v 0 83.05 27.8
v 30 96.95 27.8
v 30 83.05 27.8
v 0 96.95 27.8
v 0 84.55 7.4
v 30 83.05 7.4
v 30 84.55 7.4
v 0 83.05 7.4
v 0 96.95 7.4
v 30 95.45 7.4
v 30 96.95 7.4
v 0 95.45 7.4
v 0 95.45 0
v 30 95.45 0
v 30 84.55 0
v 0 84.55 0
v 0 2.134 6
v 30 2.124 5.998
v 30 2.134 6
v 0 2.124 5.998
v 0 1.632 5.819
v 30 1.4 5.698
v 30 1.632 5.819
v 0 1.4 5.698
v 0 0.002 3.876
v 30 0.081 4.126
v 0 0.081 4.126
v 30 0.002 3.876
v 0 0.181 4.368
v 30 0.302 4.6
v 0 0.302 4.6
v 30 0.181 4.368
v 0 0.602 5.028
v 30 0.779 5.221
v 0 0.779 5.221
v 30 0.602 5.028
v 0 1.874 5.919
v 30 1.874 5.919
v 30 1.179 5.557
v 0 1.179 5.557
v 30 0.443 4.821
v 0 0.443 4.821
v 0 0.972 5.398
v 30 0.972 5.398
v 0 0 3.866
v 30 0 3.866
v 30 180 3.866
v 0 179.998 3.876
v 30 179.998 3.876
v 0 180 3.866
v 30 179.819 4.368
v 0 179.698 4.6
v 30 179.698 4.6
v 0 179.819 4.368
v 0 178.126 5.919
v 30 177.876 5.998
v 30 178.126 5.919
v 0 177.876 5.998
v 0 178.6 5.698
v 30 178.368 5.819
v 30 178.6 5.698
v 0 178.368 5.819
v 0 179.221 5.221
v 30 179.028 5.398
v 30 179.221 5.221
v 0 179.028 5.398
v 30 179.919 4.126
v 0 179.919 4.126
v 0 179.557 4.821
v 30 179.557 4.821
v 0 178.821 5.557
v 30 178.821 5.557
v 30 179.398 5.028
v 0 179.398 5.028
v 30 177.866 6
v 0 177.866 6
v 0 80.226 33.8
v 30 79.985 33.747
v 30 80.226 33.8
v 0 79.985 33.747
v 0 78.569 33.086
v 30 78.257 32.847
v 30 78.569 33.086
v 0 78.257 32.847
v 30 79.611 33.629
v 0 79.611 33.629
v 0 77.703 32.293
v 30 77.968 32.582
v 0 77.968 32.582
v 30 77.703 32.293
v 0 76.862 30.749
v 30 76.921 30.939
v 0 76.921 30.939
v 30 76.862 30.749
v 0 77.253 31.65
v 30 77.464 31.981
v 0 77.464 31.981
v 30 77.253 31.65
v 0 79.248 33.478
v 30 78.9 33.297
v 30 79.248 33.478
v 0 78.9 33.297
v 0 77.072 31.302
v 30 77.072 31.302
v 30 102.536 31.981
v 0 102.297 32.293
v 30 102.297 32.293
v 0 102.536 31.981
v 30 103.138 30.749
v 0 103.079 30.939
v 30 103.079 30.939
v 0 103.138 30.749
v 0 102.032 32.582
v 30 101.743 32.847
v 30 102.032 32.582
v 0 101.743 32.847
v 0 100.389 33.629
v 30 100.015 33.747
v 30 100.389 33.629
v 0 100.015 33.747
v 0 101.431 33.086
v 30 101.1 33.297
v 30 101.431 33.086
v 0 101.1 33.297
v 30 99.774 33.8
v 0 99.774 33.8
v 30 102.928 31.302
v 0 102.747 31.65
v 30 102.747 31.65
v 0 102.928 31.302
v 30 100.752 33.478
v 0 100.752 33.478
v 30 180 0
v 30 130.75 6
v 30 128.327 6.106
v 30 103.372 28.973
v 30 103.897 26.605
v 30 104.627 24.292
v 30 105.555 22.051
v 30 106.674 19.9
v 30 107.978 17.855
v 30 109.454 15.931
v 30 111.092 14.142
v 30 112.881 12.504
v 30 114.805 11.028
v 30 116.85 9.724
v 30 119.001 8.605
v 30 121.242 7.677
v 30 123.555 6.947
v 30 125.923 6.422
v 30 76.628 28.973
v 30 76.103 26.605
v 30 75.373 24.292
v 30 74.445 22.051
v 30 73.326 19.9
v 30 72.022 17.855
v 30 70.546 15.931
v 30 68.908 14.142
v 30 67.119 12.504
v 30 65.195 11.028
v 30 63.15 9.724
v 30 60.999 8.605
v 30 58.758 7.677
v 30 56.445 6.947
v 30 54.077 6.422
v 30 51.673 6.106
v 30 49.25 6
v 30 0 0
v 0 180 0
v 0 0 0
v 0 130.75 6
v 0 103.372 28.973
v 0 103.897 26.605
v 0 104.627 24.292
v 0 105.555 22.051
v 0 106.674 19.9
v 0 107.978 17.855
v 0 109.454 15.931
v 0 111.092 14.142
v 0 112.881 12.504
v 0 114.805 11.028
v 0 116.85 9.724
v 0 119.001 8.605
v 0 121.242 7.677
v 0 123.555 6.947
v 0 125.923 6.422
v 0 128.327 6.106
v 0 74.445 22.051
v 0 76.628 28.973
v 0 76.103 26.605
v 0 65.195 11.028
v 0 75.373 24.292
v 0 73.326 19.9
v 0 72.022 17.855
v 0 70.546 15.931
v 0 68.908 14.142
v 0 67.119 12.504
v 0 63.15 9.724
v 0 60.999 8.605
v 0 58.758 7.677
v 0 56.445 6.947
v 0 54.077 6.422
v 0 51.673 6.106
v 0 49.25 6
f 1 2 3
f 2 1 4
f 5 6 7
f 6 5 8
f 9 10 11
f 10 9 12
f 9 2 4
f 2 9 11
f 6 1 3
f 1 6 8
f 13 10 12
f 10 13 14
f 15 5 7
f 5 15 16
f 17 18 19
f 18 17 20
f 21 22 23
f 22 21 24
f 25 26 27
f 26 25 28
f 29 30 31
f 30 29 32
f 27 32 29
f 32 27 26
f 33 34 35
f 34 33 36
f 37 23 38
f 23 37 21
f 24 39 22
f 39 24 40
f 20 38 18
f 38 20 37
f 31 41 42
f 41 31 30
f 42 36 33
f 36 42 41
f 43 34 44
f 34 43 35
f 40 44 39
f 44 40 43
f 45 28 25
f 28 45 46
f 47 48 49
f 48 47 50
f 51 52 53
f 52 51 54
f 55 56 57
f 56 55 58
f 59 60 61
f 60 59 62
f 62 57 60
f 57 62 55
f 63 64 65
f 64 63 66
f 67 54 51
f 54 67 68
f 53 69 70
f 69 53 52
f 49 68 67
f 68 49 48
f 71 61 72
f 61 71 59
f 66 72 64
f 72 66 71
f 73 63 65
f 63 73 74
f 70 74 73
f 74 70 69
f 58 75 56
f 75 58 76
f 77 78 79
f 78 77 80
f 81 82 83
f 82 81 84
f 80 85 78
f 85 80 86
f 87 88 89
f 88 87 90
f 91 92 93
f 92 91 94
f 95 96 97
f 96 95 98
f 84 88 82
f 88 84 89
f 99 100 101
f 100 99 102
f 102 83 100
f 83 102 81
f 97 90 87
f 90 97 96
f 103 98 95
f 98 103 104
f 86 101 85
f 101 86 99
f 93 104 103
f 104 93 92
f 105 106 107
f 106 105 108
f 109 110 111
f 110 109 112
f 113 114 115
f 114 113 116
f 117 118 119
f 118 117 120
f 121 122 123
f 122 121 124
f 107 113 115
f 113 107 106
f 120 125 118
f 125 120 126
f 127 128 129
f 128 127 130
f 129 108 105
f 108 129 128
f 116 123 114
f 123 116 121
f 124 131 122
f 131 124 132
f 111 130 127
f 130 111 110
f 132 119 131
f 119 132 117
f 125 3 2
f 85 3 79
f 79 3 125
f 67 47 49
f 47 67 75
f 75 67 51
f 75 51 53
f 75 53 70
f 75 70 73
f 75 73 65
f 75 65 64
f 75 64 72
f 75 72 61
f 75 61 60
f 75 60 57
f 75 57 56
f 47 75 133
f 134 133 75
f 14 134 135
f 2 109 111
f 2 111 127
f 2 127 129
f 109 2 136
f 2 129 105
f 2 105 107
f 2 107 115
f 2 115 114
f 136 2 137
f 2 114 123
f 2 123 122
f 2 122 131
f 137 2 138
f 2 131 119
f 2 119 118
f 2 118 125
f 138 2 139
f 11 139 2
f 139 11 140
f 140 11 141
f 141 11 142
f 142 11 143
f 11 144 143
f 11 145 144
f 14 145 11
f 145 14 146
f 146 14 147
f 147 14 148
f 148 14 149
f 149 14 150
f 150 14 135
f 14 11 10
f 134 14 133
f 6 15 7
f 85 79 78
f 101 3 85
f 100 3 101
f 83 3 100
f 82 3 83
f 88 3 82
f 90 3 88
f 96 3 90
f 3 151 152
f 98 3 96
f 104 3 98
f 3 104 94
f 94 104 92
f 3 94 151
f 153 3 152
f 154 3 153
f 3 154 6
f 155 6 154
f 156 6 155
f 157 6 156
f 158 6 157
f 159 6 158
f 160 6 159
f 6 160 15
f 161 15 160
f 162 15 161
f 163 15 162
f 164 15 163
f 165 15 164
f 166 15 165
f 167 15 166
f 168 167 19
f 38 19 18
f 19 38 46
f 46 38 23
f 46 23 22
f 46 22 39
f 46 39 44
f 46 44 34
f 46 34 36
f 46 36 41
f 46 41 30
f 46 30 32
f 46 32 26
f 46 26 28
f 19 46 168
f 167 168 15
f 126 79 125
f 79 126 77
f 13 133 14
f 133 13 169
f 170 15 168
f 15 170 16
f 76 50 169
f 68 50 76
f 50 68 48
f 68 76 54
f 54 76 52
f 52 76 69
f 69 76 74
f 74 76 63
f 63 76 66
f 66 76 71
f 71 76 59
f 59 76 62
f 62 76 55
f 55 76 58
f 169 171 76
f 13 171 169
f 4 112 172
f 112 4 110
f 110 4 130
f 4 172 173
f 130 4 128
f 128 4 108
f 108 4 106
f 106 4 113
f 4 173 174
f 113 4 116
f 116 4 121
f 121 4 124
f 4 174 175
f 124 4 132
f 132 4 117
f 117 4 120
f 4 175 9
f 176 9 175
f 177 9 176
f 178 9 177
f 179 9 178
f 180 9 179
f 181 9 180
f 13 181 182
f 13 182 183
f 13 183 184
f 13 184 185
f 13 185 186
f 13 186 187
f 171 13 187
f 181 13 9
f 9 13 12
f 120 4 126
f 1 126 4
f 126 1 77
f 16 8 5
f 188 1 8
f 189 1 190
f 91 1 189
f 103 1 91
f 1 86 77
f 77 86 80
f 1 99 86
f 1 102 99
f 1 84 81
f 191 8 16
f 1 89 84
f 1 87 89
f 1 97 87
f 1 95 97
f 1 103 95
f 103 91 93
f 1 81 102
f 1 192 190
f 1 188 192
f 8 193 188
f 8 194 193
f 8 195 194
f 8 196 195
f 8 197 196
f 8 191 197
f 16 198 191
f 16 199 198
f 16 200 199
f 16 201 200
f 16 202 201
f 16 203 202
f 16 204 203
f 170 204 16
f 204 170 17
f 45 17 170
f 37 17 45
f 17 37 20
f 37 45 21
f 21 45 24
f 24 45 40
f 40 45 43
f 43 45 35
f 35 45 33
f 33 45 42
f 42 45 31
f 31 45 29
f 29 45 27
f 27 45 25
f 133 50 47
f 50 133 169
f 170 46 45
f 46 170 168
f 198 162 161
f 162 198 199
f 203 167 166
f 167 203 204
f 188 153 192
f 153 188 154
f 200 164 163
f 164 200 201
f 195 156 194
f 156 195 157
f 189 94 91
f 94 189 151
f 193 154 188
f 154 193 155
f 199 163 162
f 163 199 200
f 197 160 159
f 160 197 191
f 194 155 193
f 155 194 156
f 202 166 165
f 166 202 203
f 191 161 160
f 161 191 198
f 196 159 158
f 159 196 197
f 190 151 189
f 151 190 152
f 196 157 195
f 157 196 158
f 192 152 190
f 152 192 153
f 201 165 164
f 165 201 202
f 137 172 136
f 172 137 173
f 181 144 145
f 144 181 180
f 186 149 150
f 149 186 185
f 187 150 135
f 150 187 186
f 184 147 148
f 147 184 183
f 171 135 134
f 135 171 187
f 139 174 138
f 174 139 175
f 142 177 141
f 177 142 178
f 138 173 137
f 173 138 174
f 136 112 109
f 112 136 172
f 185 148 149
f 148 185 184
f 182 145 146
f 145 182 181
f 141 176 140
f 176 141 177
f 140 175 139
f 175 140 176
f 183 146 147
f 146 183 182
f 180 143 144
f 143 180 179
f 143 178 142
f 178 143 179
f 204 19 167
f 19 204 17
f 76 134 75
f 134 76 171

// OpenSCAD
// [FL_INDEX: keywords="openscad, 3d_parametric, Clip-on_feet_for_play_yard_fence__North_States_Superyard, csg_solid" | COT="Parametric OpenSCAD design from 3DCodeverse"]
// Title: Clip-on feet for play yard fence (North States Superyard)

len = 180; // non-test: 185; test: 90;
wid = 30; // non-test: 25 (was: 30); test: 7;
thk = 6;
gap = 7.4; // == 27.8 - 20.4 (between floor and bottom rail)

w = 13.9;  // bottom rail width
h = 27.8; // rail height + floor gap // 20.4 -> .7 fillet offset; 27.8 -> .6 fillet offset
h0 = 20.4;  // rail height
clip_thk=1.5;  // inset on each side (below rail, to keep foot tight onto rail)

bottom = false;  // experimental design

rad = 27.8;  // curvature; will need to change hardcoded offsets of top fillets if this changes (see TODO below)


$fn=72;

module fillet(r, h) {
  difference() {
    cube([h, r, r]);
    translate([-1, 0, 0]) rotate([0, 90, 0]) cylinder(h=h+2, r=r);
  }
}

module main() {
  // Ugly eqn warning (lazy approach to geometry: trig it to death :)
  ph = 0.5*acos((rad-h)/rad);
  y = h/tan(ph);
  l2 = 0.5*(len - w - 2*thk);

  union() {
    difference () {
      cube([wid, len, (bottom ? h0+gap+thk/4 : h+thk)]);
      // Rounded-off top (...)
      translate([-1, l2-y, thk+rad]) rotate([0, 90, 0]) cylinder(r = rad, h = wid+2);
      translate([-1, len-l2+y, thk+rad]) rotate([0, 90, 0]) cylinder(r = rad, h = wid+2);
      translate([-1, -1, thk]) cube([wid+2, l2-y+1, h+gap+1]);
      translate([-1, len-l2+y, thk]) cube([wid+2, l2-y+1, h+gap+1]);
      // Slot
      if (bottom) {
        translate([-1, l2+thk, gap]) cube([wid+2, w, h0]);
        translate([-1, l2+1.25*thk, gap+thk/2]) cube([wid+2, w-thk/2, h0]);
      } else {
        translate([-1, l2+thk, h-h0]) cube([wid+2, w, h0]);
        translate([-1, l2+thk+clip_thk, -1]) cube([wid+2, w-2*clip_thk, h0+1]);
      }
      // Base fillet
      translate([-1,thk/2-.1,thk/2+.1]) rotate([90,0,0]) fillet(h=wid+2,r=thk/2);
      translate([-1,len-thk/2+.1,thk/2+.1]) fillet(h=wid+2,r=thk/2);
      // Top fillet; TODO: parameterize 1.5/0.4 hardcoded offsets
      translate([-1,l2+0.75*thk-(bottom?1.5:.4),thk/4+(bottom ? h0+gap-0.75*thk : h)+.1]) rotate([90,0,0]) fillet(h=wid+2,r=0.75*thk);
      translate([-1,len-l2-0.75*thk+(bottom?1.5:.4),thk/4+(bottom ? h0+gap-0.75*thk : h)+.1]) fillet(h=wid+2,r=0.75*thk);
    }
  }
}

main();
